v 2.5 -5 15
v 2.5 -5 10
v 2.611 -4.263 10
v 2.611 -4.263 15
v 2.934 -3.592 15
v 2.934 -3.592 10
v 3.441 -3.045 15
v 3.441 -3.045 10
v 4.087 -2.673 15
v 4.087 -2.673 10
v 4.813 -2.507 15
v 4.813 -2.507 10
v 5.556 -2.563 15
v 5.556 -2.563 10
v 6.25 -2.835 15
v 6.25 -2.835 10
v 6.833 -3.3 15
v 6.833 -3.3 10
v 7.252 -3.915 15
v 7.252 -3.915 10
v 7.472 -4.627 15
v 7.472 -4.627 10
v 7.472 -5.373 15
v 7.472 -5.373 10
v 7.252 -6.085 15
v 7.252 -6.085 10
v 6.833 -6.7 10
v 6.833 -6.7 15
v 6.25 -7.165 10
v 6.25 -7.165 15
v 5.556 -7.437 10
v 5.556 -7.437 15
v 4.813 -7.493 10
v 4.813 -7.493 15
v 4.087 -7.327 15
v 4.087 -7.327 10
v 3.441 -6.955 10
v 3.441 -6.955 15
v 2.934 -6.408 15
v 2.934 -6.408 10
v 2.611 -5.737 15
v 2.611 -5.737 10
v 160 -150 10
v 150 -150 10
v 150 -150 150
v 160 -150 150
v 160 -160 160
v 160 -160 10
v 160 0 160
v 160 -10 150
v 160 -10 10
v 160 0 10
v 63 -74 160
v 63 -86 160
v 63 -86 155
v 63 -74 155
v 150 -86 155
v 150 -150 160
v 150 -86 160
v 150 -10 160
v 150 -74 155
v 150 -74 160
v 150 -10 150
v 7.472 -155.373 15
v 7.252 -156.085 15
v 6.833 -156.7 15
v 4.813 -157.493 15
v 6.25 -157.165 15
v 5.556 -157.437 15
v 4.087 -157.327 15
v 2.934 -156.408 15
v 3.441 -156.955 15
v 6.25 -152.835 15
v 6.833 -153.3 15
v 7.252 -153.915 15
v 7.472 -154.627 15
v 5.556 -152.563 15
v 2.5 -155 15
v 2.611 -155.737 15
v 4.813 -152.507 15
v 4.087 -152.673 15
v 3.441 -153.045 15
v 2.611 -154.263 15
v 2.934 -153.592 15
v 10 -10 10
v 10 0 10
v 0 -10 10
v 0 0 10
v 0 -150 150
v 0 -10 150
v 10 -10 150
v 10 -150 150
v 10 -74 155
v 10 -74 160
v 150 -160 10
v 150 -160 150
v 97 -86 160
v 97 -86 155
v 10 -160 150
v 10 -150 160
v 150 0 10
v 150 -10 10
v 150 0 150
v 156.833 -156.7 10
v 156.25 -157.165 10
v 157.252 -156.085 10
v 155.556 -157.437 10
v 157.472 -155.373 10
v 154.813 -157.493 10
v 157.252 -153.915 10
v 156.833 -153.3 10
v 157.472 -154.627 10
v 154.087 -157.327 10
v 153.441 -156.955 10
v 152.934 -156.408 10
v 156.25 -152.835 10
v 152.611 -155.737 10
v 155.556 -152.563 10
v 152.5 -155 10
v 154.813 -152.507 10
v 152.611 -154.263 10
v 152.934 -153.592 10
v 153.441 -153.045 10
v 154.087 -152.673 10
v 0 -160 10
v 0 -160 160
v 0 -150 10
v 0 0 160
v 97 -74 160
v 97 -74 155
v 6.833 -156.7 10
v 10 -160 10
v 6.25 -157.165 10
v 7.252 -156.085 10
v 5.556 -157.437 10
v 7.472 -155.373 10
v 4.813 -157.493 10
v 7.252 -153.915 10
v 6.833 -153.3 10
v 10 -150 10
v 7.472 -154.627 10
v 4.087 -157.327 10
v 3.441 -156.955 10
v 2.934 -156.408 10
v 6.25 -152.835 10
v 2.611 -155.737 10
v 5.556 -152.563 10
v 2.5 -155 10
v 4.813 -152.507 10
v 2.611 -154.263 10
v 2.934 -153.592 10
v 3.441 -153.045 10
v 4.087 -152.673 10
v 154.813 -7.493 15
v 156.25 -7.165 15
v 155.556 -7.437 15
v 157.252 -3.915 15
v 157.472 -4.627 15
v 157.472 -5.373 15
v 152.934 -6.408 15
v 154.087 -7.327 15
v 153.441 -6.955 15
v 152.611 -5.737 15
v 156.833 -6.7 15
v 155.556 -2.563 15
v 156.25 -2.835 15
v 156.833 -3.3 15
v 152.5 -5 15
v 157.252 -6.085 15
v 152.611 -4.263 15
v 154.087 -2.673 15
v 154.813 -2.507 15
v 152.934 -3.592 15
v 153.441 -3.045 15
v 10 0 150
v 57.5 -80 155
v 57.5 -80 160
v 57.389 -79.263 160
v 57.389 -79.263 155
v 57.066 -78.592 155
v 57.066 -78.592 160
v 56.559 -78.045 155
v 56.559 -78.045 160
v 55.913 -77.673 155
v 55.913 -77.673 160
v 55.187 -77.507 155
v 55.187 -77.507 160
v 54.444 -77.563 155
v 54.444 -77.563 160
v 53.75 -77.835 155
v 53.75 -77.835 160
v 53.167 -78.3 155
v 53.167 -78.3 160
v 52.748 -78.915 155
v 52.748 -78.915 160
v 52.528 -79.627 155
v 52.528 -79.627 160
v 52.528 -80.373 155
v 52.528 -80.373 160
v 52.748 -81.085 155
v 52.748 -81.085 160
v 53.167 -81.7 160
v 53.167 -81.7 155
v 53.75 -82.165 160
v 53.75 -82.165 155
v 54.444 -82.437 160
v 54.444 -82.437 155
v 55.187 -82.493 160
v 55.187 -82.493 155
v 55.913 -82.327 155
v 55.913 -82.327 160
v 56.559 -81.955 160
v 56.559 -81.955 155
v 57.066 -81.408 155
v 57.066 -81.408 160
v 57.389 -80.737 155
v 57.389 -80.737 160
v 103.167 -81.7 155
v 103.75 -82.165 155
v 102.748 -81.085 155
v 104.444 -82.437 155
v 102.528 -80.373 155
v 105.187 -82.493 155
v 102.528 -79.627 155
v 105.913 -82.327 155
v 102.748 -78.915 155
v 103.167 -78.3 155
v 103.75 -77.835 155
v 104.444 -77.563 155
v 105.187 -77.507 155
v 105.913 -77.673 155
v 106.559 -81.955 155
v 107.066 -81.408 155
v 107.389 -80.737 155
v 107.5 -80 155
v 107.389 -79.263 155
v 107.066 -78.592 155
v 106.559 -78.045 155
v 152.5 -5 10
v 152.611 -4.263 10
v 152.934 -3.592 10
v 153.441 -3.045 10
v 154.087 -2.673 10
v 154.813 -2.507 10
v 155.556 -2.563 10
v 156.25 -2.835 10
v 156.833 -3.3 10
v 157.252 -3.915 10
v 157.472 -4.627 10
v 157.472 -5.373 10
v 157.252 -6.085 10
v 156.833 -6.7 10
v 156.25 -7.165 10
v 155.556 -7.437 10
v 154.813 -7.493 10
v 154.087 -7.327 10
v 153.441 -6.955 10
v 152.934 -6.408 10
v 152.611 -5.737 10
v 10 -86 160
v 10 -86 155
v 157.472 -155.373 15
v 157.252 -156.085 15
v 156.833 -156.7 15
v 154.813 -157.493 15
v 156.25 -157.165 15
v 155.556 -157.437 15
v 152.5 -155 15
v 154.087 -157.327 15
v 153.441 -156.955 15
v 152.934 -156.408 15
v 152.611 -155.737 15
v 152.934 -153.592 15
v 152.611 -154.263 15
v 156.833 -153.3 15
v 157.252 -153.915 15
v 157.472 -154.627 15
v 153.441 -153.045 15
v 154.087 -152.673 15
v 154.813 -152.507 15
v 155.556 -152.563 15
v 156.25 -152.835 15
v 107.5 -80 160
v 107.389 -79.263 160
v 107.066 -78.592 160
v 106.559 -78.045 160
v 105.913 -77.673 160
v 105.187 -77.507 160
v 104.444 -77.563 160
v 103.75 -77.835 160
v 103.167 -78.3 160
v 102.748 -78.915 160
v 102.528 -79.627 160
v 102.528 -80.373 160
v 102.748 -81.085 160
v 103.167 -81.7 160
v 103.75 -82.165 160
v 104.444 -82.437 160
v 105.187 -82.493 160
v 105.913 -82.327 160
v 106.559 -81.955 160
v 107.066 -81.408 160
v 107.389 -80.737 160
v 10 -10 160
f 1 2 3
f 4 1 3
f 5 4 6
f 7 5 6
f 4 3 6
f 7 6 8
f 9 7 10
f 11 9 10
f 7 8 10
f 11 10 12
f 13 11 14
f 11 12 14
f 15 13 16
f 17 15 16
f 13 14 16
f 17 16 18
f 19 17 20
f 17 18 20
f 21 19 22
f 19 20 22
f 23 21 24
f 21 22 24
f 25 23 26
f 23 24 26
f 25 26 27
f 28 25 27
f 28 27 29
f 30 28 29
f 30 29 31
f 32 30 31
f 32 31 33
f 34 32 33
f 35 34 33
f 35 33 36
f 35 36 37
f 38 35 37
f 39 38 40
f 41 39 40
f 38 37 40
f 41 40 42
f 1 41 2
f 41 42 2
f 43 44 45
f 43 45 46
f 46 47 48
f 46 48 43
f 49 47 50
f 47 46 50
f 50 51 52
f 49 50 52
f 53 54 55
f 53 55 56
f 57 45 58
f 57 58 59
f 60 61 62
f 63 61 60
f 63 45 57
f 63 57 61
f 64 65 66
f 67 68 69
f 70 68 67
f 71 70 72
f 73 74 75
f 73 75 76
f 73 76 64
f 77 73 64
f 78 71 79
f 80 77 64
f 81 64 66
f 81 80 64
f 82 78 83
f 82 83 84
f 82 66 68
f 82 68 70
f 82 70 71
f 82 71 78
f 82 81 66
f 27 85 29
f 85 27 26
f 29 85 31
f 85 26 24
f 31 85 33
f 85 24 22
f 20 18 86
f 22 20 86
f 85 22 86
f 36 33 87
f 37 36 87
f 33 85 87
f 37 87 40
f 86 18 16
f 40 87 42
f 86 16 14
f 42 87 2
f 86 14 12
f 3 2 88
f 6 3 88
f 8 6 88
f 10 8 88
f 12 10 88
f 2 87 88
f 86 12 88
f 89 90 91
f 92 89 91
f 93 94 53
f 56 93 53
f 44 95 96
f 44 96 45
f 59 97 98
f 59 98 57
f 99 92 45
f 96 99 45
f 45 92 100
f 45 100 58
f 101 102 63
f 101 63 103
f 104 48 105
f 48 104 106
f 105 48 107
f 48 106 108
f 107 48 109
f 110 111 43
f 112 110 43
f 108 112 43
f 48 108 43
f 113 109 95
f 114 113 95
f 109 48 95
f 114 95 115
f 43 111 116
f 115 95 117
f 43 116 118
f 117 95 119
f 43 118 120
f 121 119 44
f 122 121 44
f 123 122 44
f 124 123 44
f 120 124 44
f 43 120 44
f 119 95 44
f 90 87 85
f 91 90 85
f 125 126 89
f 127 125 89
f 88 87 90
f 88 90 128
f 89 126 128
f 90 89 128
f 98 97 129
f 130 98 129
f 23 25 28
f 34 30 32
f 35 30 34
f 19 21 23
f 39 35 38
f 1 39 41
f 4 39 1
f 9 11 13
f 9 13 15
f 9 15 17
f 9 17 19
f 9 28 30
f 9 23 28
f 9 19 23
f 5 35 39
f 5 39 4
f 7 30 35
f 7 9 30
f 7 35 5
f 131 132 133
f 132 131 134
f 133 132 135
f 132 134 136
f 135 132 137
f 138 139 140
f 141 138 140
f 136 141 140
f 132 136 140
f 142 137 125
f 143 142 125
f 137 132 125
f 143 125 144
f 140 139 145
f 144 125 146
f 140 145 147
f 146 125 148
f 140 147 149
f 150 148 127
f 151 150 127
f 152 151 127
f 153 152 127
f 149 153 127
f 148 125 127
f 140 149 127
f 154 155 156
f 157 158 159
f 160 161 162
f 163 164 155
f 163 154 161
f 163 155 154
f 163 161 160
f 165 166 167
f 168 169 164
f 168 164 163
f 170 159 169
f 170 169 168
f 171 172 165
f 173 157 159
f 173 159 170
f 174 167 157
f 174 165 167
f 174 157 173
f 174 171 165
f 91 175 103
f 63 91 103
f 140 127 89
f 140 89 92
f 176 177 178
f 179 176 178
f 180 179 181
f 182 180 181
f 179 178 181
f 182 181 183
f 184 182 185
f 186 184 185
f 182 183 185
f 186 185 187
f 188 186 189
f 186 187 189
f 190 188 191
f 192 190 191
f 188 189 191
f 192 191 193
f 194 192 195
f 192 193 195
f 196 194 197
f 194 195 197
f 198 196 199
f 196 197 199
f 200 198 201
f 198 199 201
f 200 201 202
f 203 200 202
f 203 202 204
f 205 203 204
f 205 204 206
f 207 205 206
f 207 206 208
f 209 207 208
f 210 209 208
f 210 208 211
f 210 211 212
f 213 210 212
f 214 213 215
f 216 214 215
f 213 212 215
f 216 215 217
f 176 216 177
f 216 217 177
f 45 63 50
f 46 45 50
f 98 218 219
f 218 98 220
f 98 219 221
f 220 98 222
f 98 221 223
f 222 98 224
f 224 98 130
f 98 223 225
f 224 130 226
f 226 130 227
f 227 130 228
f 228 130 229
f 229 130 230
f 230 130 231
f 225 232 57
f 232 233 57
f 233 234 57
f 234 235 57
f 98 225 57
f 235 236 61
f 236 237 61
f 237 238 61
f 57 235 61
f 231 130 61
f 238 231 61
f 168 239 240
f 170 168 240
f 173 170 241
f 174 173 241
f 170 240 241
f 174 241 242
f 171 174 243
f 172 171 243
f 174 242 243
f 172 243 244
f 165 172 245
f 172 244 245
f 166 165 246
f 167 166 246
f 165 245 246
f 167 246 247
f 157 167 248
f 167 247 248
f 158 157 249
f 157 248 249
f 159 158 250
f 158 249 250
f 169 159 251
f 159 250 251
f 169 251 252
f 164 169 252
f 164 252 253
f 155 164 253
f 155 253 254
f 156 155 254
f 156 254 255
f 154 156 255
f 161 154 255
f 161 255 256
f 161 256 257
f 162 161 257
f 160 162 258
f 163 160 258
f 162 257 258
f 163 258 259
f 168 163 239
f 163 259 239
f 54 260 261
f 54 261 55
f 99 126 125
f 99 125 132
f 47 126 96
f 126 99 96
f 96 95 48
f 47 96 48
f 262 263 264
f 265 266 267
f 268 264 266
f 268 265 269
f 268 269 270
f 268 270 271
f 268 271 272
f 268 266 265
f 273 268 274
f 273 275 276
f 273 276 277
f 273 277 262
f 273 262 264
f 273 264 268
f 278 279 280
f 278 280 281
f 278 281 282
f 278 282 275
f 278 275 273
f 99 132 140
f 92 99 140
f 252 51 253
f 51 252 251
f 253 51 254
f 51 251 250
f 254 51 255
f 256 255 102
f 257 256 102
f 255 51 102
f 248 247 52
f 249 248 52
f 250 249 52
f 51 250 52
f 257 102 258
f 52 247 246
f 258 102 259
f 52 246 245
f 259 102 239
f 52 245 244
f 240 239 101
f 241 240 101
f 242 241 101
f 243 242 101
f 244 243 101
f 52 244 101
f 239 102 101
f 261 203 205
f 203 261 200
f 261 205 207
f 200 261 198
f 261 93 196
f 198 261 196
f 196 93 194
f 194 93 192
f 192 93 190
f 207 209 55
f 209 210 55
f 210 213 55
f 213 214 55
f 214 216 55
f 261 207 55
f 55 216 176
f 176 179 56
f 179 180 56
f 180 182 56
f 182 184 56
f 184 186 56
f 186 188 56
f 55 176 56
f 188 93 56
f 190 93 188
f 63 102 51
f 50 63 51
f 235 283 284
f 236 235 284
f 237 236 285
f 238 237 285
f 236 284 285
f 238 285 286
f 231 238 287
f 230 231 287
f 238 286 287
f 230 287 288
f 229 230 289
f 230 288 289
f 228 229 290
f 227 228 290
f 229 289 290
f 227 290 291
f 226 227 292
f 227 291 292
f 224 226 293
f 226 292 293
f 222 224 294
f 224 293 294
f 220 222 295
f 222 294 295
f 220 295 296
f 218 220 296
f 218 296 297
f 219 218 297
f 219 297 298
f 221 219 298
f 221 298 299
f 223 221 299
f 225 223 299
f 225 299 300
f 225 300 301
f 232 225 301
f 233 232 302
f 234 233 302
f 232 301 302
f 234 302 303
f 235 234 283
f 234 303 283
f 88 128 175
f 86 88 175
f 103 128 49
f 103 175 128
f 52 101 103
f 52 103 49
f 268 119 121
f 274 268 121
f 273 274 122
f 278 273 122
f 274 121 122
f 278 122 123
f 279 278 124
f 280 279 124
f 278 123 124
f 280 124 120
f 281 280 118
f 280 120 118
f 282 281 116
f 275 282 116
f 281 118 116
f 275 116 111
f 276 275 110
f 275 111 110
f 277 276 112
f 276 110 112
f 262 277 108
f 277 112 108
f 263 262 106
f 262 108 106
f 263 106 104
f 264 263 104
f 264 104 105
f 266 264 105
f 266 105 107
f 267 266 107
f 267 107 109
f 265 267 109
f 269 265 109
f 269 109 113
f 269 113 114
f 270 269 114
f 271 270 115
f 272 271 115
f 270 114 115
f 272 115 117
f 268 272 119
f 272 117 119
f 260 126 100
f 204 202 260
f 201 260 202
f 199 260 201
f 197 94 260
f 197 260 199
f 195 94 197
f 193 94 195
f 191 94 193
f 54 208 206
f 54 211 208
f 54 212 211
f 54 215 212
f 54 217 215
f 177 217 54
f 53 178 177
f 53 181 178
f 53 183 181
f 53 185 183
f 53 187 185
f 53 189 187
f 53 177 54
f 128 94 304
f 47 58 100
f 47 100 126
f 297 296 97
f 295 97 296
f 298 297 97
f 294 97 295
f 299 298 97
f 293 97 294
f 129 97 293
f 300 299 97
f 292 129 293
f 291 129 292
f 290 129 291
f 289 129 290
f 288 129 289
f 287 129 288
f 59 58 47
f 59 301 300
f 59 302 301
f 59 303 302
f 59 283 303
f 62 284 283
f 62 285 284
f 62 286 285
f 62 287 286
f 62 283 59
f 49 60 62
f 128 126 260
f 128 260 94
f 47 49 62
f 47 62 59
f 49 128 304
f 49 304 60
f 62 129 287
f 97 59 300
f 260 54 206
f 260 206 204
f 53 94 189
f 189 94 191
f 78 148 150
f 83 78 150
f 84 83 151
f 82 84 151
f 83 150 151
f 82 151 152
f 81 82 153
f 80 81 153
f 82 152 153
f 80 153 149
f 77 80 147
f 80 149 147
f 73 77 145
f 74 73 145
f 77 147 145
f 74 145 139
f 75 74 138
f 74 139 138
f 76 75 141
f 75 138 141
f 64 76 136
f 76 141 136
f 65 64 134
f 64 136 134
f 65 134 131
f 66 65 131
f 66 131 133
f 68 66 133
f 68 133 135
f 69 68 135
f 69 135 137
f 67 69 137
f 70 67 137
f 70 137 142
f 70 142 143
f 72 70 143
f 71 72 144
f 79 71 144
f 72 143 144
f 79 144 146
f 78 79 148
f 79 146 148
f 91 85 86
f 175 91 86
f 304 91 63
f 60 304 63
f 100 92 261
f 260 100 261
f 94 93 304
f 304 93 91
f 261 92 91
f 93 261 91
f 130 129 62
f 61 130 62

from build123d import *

# Parameters (mm, degrees)
CROQUIS2_W                   = 160
CROQUIS2_H                   = 160
CROQUIS2_W_2                 = 140
CROQUIS2_H_2                 = 140
SALIENTE_EXTRUIR1_DEPTH      = 10
CROQUIS3_W                   = 152
CROQUIS3_H                   = 152
CROQUIS3_W_2                 = 148
CROQUIS3_H_2                 = 148
CORTAR_EXTRUIR1_DEPTH        = 3.5
SALIENTE_EXTRUIR2_DEPTH      = 140
SALIENTE_EXTRUIR2_DEPTH_BACK = 10
CROQUIS4_W                   = 10
CROQUIS4_H                   = 10
CROQUIS7_W                   = 160
CROQUIS7_H                   = 160
CROQUIS7_W_2                 = 140
CROQUIS7_H_2                 = 140
SALIENTE_EXTRUIR3_DEPTH      = 10
CROQUIS8_W                   = 63
CROQUIS8_H                   = 12
CROQUIS8_R                   = 2.5
SALIENTE_EXTRUIR4_DEPTH      = 5
CROQUIS9_W                   = 10
CROQUIS9_H                   = 160
CORTAR_EXTRUIR2_DEPTH        = 278.128129211
CROQUIS10_R                  = 2.5
CORTAR_EXTRUIR3_DEPTH        = 5


with BuildPart() as part:
    # Croquis2 → Saliente-Extruir1 (new body)
    with BuildSketch(Plane.XY):
        with Locations((80, -80)):
            Rectangle(CROQUIS2_W, CROQUIS2_H)
        with Locations((80, -80)):
            Rectangle(CROQUIS2_W_2, CROQUIS2_H_2, mode=Mode.SUBTRACT)
    extrude(amount=SALIENTE_EXTRUIR1_DEPTH)

    # Croquis3 → Cortar-Extruir1 (cut)
    with BuildSketch(Plane.XY.offset(10)):
        with Locations((80, -80)):
            Rectangle(CROQUIS3_W, CROQUIS3_H)
        with Locations((80, -80)):
            Rectangle(CROQUIS3_W_2, CROQUIS3_H_2, mode=Mode.SUBTRACT)
    extrude(amount=-CORTAR_EXTRUIR1_DEPTH, mode=Mode.SUBTRACT)

    # Croquis4 → Saliente-Extruir2 (add, two sides: drawn at the far end of the back side and taken through both)
    with BuildSketch(Plane.XY.offset(10).offset(-SALIENTE_EXTRUIR2_DEPTH_BACK)):
        with Locations((5, -5)):
            Rectangle(CROQUIS4_W, CROQUIS4_H)
        with Locations((155, -5)):
            Rectangle(CROQUIS4_W, CROQUIS4_H)
        with Locations((155, -155)):
            Rectangle(CROQUIS4_W, CROQUIS4_H)
        with Locations((5, -155)):
            Rectangle(CROQUIS4_W, CROQUIS4_H)
    extrude(amount=SALIENTE_EXTRUIR2_DEPTH + SALIENTE_EXTRUIR2_DEPTH_BACK)

    # Croquis7 → Saliente-Extruir3 (add)
    with BuildSketch(Plane.XY.offset(150)):
        with Locations((80, -80)):
            Rectangle(CROQUIS7_W, CROQUIS7_H)
        with Locations((80, -80)):
            Rectangle(CROQUIS7_W_2, CROQUIS7_H_2, mode=Mode.SUBTRACT)
    extrude(amount=SALIENTE_EXTRUIR3_DEPTH)

    # Croquis8 → Saliente-Extruir4 (add)
    # profile 1 of 2: a face of its own
    with BuildSketch(Plane.XY.offset(160)):
        with Locations((31.5, -80)):
            Rectangle(CROQUIS8_W, CROQUIS8_H)
        with Locations((55, -80)):
            Circle(CROQUIS8_R, mode=Mode.SUBTRACT)
    # profile 2 of 2: a face of its own
    with BuildSketch(Plane.XY.offset(160)):
        with Locations((128.5, -80)):
            Rectangle(CROQUIS8_W, CROQUIS8_H)
        with Locations((105, -80)):
            Circle(CROQUIS8_R, mode=Mode.SUBTRACT)
    extrude(amount=-SALIENTE_EXTRUIR4_DEPTH)

    # Croquis9 → Cortar-Extruir2 (cut, through all)
    with BuildSketch(Plane.ZY):
        with Locations((5, -80)):
            Rectangle(CROQUIS9_W, CROQUIS9_H)
    extrude(amount=-CORTAR_EXTRUIR2_DEPTH, mode=Mode.SUBTRACT)

    # Croquis10 → Cortar-Extruir3 (cut)
    with BuildSketch(Plane(origin=(0, 0, 10), x_dir=(-1, 0, 0), z_dir=(0, 0, -1))):
        with Locations((-155, -155)):
            Circle(CROQUIS10_R)
        with Locations((-5, -5)):
            Circle(CROQUIS10_R)
        with Locations((-155, -5)):
            Circle(CROQUIS10_R)
        with Locations((-5, -155)):
            Circle(CROQUIS10_R)
    extrude(amount=-CORTAR_EXTRUIR3_DEPTH, mode=Mode.SUBTRACT)


solid = part.part
